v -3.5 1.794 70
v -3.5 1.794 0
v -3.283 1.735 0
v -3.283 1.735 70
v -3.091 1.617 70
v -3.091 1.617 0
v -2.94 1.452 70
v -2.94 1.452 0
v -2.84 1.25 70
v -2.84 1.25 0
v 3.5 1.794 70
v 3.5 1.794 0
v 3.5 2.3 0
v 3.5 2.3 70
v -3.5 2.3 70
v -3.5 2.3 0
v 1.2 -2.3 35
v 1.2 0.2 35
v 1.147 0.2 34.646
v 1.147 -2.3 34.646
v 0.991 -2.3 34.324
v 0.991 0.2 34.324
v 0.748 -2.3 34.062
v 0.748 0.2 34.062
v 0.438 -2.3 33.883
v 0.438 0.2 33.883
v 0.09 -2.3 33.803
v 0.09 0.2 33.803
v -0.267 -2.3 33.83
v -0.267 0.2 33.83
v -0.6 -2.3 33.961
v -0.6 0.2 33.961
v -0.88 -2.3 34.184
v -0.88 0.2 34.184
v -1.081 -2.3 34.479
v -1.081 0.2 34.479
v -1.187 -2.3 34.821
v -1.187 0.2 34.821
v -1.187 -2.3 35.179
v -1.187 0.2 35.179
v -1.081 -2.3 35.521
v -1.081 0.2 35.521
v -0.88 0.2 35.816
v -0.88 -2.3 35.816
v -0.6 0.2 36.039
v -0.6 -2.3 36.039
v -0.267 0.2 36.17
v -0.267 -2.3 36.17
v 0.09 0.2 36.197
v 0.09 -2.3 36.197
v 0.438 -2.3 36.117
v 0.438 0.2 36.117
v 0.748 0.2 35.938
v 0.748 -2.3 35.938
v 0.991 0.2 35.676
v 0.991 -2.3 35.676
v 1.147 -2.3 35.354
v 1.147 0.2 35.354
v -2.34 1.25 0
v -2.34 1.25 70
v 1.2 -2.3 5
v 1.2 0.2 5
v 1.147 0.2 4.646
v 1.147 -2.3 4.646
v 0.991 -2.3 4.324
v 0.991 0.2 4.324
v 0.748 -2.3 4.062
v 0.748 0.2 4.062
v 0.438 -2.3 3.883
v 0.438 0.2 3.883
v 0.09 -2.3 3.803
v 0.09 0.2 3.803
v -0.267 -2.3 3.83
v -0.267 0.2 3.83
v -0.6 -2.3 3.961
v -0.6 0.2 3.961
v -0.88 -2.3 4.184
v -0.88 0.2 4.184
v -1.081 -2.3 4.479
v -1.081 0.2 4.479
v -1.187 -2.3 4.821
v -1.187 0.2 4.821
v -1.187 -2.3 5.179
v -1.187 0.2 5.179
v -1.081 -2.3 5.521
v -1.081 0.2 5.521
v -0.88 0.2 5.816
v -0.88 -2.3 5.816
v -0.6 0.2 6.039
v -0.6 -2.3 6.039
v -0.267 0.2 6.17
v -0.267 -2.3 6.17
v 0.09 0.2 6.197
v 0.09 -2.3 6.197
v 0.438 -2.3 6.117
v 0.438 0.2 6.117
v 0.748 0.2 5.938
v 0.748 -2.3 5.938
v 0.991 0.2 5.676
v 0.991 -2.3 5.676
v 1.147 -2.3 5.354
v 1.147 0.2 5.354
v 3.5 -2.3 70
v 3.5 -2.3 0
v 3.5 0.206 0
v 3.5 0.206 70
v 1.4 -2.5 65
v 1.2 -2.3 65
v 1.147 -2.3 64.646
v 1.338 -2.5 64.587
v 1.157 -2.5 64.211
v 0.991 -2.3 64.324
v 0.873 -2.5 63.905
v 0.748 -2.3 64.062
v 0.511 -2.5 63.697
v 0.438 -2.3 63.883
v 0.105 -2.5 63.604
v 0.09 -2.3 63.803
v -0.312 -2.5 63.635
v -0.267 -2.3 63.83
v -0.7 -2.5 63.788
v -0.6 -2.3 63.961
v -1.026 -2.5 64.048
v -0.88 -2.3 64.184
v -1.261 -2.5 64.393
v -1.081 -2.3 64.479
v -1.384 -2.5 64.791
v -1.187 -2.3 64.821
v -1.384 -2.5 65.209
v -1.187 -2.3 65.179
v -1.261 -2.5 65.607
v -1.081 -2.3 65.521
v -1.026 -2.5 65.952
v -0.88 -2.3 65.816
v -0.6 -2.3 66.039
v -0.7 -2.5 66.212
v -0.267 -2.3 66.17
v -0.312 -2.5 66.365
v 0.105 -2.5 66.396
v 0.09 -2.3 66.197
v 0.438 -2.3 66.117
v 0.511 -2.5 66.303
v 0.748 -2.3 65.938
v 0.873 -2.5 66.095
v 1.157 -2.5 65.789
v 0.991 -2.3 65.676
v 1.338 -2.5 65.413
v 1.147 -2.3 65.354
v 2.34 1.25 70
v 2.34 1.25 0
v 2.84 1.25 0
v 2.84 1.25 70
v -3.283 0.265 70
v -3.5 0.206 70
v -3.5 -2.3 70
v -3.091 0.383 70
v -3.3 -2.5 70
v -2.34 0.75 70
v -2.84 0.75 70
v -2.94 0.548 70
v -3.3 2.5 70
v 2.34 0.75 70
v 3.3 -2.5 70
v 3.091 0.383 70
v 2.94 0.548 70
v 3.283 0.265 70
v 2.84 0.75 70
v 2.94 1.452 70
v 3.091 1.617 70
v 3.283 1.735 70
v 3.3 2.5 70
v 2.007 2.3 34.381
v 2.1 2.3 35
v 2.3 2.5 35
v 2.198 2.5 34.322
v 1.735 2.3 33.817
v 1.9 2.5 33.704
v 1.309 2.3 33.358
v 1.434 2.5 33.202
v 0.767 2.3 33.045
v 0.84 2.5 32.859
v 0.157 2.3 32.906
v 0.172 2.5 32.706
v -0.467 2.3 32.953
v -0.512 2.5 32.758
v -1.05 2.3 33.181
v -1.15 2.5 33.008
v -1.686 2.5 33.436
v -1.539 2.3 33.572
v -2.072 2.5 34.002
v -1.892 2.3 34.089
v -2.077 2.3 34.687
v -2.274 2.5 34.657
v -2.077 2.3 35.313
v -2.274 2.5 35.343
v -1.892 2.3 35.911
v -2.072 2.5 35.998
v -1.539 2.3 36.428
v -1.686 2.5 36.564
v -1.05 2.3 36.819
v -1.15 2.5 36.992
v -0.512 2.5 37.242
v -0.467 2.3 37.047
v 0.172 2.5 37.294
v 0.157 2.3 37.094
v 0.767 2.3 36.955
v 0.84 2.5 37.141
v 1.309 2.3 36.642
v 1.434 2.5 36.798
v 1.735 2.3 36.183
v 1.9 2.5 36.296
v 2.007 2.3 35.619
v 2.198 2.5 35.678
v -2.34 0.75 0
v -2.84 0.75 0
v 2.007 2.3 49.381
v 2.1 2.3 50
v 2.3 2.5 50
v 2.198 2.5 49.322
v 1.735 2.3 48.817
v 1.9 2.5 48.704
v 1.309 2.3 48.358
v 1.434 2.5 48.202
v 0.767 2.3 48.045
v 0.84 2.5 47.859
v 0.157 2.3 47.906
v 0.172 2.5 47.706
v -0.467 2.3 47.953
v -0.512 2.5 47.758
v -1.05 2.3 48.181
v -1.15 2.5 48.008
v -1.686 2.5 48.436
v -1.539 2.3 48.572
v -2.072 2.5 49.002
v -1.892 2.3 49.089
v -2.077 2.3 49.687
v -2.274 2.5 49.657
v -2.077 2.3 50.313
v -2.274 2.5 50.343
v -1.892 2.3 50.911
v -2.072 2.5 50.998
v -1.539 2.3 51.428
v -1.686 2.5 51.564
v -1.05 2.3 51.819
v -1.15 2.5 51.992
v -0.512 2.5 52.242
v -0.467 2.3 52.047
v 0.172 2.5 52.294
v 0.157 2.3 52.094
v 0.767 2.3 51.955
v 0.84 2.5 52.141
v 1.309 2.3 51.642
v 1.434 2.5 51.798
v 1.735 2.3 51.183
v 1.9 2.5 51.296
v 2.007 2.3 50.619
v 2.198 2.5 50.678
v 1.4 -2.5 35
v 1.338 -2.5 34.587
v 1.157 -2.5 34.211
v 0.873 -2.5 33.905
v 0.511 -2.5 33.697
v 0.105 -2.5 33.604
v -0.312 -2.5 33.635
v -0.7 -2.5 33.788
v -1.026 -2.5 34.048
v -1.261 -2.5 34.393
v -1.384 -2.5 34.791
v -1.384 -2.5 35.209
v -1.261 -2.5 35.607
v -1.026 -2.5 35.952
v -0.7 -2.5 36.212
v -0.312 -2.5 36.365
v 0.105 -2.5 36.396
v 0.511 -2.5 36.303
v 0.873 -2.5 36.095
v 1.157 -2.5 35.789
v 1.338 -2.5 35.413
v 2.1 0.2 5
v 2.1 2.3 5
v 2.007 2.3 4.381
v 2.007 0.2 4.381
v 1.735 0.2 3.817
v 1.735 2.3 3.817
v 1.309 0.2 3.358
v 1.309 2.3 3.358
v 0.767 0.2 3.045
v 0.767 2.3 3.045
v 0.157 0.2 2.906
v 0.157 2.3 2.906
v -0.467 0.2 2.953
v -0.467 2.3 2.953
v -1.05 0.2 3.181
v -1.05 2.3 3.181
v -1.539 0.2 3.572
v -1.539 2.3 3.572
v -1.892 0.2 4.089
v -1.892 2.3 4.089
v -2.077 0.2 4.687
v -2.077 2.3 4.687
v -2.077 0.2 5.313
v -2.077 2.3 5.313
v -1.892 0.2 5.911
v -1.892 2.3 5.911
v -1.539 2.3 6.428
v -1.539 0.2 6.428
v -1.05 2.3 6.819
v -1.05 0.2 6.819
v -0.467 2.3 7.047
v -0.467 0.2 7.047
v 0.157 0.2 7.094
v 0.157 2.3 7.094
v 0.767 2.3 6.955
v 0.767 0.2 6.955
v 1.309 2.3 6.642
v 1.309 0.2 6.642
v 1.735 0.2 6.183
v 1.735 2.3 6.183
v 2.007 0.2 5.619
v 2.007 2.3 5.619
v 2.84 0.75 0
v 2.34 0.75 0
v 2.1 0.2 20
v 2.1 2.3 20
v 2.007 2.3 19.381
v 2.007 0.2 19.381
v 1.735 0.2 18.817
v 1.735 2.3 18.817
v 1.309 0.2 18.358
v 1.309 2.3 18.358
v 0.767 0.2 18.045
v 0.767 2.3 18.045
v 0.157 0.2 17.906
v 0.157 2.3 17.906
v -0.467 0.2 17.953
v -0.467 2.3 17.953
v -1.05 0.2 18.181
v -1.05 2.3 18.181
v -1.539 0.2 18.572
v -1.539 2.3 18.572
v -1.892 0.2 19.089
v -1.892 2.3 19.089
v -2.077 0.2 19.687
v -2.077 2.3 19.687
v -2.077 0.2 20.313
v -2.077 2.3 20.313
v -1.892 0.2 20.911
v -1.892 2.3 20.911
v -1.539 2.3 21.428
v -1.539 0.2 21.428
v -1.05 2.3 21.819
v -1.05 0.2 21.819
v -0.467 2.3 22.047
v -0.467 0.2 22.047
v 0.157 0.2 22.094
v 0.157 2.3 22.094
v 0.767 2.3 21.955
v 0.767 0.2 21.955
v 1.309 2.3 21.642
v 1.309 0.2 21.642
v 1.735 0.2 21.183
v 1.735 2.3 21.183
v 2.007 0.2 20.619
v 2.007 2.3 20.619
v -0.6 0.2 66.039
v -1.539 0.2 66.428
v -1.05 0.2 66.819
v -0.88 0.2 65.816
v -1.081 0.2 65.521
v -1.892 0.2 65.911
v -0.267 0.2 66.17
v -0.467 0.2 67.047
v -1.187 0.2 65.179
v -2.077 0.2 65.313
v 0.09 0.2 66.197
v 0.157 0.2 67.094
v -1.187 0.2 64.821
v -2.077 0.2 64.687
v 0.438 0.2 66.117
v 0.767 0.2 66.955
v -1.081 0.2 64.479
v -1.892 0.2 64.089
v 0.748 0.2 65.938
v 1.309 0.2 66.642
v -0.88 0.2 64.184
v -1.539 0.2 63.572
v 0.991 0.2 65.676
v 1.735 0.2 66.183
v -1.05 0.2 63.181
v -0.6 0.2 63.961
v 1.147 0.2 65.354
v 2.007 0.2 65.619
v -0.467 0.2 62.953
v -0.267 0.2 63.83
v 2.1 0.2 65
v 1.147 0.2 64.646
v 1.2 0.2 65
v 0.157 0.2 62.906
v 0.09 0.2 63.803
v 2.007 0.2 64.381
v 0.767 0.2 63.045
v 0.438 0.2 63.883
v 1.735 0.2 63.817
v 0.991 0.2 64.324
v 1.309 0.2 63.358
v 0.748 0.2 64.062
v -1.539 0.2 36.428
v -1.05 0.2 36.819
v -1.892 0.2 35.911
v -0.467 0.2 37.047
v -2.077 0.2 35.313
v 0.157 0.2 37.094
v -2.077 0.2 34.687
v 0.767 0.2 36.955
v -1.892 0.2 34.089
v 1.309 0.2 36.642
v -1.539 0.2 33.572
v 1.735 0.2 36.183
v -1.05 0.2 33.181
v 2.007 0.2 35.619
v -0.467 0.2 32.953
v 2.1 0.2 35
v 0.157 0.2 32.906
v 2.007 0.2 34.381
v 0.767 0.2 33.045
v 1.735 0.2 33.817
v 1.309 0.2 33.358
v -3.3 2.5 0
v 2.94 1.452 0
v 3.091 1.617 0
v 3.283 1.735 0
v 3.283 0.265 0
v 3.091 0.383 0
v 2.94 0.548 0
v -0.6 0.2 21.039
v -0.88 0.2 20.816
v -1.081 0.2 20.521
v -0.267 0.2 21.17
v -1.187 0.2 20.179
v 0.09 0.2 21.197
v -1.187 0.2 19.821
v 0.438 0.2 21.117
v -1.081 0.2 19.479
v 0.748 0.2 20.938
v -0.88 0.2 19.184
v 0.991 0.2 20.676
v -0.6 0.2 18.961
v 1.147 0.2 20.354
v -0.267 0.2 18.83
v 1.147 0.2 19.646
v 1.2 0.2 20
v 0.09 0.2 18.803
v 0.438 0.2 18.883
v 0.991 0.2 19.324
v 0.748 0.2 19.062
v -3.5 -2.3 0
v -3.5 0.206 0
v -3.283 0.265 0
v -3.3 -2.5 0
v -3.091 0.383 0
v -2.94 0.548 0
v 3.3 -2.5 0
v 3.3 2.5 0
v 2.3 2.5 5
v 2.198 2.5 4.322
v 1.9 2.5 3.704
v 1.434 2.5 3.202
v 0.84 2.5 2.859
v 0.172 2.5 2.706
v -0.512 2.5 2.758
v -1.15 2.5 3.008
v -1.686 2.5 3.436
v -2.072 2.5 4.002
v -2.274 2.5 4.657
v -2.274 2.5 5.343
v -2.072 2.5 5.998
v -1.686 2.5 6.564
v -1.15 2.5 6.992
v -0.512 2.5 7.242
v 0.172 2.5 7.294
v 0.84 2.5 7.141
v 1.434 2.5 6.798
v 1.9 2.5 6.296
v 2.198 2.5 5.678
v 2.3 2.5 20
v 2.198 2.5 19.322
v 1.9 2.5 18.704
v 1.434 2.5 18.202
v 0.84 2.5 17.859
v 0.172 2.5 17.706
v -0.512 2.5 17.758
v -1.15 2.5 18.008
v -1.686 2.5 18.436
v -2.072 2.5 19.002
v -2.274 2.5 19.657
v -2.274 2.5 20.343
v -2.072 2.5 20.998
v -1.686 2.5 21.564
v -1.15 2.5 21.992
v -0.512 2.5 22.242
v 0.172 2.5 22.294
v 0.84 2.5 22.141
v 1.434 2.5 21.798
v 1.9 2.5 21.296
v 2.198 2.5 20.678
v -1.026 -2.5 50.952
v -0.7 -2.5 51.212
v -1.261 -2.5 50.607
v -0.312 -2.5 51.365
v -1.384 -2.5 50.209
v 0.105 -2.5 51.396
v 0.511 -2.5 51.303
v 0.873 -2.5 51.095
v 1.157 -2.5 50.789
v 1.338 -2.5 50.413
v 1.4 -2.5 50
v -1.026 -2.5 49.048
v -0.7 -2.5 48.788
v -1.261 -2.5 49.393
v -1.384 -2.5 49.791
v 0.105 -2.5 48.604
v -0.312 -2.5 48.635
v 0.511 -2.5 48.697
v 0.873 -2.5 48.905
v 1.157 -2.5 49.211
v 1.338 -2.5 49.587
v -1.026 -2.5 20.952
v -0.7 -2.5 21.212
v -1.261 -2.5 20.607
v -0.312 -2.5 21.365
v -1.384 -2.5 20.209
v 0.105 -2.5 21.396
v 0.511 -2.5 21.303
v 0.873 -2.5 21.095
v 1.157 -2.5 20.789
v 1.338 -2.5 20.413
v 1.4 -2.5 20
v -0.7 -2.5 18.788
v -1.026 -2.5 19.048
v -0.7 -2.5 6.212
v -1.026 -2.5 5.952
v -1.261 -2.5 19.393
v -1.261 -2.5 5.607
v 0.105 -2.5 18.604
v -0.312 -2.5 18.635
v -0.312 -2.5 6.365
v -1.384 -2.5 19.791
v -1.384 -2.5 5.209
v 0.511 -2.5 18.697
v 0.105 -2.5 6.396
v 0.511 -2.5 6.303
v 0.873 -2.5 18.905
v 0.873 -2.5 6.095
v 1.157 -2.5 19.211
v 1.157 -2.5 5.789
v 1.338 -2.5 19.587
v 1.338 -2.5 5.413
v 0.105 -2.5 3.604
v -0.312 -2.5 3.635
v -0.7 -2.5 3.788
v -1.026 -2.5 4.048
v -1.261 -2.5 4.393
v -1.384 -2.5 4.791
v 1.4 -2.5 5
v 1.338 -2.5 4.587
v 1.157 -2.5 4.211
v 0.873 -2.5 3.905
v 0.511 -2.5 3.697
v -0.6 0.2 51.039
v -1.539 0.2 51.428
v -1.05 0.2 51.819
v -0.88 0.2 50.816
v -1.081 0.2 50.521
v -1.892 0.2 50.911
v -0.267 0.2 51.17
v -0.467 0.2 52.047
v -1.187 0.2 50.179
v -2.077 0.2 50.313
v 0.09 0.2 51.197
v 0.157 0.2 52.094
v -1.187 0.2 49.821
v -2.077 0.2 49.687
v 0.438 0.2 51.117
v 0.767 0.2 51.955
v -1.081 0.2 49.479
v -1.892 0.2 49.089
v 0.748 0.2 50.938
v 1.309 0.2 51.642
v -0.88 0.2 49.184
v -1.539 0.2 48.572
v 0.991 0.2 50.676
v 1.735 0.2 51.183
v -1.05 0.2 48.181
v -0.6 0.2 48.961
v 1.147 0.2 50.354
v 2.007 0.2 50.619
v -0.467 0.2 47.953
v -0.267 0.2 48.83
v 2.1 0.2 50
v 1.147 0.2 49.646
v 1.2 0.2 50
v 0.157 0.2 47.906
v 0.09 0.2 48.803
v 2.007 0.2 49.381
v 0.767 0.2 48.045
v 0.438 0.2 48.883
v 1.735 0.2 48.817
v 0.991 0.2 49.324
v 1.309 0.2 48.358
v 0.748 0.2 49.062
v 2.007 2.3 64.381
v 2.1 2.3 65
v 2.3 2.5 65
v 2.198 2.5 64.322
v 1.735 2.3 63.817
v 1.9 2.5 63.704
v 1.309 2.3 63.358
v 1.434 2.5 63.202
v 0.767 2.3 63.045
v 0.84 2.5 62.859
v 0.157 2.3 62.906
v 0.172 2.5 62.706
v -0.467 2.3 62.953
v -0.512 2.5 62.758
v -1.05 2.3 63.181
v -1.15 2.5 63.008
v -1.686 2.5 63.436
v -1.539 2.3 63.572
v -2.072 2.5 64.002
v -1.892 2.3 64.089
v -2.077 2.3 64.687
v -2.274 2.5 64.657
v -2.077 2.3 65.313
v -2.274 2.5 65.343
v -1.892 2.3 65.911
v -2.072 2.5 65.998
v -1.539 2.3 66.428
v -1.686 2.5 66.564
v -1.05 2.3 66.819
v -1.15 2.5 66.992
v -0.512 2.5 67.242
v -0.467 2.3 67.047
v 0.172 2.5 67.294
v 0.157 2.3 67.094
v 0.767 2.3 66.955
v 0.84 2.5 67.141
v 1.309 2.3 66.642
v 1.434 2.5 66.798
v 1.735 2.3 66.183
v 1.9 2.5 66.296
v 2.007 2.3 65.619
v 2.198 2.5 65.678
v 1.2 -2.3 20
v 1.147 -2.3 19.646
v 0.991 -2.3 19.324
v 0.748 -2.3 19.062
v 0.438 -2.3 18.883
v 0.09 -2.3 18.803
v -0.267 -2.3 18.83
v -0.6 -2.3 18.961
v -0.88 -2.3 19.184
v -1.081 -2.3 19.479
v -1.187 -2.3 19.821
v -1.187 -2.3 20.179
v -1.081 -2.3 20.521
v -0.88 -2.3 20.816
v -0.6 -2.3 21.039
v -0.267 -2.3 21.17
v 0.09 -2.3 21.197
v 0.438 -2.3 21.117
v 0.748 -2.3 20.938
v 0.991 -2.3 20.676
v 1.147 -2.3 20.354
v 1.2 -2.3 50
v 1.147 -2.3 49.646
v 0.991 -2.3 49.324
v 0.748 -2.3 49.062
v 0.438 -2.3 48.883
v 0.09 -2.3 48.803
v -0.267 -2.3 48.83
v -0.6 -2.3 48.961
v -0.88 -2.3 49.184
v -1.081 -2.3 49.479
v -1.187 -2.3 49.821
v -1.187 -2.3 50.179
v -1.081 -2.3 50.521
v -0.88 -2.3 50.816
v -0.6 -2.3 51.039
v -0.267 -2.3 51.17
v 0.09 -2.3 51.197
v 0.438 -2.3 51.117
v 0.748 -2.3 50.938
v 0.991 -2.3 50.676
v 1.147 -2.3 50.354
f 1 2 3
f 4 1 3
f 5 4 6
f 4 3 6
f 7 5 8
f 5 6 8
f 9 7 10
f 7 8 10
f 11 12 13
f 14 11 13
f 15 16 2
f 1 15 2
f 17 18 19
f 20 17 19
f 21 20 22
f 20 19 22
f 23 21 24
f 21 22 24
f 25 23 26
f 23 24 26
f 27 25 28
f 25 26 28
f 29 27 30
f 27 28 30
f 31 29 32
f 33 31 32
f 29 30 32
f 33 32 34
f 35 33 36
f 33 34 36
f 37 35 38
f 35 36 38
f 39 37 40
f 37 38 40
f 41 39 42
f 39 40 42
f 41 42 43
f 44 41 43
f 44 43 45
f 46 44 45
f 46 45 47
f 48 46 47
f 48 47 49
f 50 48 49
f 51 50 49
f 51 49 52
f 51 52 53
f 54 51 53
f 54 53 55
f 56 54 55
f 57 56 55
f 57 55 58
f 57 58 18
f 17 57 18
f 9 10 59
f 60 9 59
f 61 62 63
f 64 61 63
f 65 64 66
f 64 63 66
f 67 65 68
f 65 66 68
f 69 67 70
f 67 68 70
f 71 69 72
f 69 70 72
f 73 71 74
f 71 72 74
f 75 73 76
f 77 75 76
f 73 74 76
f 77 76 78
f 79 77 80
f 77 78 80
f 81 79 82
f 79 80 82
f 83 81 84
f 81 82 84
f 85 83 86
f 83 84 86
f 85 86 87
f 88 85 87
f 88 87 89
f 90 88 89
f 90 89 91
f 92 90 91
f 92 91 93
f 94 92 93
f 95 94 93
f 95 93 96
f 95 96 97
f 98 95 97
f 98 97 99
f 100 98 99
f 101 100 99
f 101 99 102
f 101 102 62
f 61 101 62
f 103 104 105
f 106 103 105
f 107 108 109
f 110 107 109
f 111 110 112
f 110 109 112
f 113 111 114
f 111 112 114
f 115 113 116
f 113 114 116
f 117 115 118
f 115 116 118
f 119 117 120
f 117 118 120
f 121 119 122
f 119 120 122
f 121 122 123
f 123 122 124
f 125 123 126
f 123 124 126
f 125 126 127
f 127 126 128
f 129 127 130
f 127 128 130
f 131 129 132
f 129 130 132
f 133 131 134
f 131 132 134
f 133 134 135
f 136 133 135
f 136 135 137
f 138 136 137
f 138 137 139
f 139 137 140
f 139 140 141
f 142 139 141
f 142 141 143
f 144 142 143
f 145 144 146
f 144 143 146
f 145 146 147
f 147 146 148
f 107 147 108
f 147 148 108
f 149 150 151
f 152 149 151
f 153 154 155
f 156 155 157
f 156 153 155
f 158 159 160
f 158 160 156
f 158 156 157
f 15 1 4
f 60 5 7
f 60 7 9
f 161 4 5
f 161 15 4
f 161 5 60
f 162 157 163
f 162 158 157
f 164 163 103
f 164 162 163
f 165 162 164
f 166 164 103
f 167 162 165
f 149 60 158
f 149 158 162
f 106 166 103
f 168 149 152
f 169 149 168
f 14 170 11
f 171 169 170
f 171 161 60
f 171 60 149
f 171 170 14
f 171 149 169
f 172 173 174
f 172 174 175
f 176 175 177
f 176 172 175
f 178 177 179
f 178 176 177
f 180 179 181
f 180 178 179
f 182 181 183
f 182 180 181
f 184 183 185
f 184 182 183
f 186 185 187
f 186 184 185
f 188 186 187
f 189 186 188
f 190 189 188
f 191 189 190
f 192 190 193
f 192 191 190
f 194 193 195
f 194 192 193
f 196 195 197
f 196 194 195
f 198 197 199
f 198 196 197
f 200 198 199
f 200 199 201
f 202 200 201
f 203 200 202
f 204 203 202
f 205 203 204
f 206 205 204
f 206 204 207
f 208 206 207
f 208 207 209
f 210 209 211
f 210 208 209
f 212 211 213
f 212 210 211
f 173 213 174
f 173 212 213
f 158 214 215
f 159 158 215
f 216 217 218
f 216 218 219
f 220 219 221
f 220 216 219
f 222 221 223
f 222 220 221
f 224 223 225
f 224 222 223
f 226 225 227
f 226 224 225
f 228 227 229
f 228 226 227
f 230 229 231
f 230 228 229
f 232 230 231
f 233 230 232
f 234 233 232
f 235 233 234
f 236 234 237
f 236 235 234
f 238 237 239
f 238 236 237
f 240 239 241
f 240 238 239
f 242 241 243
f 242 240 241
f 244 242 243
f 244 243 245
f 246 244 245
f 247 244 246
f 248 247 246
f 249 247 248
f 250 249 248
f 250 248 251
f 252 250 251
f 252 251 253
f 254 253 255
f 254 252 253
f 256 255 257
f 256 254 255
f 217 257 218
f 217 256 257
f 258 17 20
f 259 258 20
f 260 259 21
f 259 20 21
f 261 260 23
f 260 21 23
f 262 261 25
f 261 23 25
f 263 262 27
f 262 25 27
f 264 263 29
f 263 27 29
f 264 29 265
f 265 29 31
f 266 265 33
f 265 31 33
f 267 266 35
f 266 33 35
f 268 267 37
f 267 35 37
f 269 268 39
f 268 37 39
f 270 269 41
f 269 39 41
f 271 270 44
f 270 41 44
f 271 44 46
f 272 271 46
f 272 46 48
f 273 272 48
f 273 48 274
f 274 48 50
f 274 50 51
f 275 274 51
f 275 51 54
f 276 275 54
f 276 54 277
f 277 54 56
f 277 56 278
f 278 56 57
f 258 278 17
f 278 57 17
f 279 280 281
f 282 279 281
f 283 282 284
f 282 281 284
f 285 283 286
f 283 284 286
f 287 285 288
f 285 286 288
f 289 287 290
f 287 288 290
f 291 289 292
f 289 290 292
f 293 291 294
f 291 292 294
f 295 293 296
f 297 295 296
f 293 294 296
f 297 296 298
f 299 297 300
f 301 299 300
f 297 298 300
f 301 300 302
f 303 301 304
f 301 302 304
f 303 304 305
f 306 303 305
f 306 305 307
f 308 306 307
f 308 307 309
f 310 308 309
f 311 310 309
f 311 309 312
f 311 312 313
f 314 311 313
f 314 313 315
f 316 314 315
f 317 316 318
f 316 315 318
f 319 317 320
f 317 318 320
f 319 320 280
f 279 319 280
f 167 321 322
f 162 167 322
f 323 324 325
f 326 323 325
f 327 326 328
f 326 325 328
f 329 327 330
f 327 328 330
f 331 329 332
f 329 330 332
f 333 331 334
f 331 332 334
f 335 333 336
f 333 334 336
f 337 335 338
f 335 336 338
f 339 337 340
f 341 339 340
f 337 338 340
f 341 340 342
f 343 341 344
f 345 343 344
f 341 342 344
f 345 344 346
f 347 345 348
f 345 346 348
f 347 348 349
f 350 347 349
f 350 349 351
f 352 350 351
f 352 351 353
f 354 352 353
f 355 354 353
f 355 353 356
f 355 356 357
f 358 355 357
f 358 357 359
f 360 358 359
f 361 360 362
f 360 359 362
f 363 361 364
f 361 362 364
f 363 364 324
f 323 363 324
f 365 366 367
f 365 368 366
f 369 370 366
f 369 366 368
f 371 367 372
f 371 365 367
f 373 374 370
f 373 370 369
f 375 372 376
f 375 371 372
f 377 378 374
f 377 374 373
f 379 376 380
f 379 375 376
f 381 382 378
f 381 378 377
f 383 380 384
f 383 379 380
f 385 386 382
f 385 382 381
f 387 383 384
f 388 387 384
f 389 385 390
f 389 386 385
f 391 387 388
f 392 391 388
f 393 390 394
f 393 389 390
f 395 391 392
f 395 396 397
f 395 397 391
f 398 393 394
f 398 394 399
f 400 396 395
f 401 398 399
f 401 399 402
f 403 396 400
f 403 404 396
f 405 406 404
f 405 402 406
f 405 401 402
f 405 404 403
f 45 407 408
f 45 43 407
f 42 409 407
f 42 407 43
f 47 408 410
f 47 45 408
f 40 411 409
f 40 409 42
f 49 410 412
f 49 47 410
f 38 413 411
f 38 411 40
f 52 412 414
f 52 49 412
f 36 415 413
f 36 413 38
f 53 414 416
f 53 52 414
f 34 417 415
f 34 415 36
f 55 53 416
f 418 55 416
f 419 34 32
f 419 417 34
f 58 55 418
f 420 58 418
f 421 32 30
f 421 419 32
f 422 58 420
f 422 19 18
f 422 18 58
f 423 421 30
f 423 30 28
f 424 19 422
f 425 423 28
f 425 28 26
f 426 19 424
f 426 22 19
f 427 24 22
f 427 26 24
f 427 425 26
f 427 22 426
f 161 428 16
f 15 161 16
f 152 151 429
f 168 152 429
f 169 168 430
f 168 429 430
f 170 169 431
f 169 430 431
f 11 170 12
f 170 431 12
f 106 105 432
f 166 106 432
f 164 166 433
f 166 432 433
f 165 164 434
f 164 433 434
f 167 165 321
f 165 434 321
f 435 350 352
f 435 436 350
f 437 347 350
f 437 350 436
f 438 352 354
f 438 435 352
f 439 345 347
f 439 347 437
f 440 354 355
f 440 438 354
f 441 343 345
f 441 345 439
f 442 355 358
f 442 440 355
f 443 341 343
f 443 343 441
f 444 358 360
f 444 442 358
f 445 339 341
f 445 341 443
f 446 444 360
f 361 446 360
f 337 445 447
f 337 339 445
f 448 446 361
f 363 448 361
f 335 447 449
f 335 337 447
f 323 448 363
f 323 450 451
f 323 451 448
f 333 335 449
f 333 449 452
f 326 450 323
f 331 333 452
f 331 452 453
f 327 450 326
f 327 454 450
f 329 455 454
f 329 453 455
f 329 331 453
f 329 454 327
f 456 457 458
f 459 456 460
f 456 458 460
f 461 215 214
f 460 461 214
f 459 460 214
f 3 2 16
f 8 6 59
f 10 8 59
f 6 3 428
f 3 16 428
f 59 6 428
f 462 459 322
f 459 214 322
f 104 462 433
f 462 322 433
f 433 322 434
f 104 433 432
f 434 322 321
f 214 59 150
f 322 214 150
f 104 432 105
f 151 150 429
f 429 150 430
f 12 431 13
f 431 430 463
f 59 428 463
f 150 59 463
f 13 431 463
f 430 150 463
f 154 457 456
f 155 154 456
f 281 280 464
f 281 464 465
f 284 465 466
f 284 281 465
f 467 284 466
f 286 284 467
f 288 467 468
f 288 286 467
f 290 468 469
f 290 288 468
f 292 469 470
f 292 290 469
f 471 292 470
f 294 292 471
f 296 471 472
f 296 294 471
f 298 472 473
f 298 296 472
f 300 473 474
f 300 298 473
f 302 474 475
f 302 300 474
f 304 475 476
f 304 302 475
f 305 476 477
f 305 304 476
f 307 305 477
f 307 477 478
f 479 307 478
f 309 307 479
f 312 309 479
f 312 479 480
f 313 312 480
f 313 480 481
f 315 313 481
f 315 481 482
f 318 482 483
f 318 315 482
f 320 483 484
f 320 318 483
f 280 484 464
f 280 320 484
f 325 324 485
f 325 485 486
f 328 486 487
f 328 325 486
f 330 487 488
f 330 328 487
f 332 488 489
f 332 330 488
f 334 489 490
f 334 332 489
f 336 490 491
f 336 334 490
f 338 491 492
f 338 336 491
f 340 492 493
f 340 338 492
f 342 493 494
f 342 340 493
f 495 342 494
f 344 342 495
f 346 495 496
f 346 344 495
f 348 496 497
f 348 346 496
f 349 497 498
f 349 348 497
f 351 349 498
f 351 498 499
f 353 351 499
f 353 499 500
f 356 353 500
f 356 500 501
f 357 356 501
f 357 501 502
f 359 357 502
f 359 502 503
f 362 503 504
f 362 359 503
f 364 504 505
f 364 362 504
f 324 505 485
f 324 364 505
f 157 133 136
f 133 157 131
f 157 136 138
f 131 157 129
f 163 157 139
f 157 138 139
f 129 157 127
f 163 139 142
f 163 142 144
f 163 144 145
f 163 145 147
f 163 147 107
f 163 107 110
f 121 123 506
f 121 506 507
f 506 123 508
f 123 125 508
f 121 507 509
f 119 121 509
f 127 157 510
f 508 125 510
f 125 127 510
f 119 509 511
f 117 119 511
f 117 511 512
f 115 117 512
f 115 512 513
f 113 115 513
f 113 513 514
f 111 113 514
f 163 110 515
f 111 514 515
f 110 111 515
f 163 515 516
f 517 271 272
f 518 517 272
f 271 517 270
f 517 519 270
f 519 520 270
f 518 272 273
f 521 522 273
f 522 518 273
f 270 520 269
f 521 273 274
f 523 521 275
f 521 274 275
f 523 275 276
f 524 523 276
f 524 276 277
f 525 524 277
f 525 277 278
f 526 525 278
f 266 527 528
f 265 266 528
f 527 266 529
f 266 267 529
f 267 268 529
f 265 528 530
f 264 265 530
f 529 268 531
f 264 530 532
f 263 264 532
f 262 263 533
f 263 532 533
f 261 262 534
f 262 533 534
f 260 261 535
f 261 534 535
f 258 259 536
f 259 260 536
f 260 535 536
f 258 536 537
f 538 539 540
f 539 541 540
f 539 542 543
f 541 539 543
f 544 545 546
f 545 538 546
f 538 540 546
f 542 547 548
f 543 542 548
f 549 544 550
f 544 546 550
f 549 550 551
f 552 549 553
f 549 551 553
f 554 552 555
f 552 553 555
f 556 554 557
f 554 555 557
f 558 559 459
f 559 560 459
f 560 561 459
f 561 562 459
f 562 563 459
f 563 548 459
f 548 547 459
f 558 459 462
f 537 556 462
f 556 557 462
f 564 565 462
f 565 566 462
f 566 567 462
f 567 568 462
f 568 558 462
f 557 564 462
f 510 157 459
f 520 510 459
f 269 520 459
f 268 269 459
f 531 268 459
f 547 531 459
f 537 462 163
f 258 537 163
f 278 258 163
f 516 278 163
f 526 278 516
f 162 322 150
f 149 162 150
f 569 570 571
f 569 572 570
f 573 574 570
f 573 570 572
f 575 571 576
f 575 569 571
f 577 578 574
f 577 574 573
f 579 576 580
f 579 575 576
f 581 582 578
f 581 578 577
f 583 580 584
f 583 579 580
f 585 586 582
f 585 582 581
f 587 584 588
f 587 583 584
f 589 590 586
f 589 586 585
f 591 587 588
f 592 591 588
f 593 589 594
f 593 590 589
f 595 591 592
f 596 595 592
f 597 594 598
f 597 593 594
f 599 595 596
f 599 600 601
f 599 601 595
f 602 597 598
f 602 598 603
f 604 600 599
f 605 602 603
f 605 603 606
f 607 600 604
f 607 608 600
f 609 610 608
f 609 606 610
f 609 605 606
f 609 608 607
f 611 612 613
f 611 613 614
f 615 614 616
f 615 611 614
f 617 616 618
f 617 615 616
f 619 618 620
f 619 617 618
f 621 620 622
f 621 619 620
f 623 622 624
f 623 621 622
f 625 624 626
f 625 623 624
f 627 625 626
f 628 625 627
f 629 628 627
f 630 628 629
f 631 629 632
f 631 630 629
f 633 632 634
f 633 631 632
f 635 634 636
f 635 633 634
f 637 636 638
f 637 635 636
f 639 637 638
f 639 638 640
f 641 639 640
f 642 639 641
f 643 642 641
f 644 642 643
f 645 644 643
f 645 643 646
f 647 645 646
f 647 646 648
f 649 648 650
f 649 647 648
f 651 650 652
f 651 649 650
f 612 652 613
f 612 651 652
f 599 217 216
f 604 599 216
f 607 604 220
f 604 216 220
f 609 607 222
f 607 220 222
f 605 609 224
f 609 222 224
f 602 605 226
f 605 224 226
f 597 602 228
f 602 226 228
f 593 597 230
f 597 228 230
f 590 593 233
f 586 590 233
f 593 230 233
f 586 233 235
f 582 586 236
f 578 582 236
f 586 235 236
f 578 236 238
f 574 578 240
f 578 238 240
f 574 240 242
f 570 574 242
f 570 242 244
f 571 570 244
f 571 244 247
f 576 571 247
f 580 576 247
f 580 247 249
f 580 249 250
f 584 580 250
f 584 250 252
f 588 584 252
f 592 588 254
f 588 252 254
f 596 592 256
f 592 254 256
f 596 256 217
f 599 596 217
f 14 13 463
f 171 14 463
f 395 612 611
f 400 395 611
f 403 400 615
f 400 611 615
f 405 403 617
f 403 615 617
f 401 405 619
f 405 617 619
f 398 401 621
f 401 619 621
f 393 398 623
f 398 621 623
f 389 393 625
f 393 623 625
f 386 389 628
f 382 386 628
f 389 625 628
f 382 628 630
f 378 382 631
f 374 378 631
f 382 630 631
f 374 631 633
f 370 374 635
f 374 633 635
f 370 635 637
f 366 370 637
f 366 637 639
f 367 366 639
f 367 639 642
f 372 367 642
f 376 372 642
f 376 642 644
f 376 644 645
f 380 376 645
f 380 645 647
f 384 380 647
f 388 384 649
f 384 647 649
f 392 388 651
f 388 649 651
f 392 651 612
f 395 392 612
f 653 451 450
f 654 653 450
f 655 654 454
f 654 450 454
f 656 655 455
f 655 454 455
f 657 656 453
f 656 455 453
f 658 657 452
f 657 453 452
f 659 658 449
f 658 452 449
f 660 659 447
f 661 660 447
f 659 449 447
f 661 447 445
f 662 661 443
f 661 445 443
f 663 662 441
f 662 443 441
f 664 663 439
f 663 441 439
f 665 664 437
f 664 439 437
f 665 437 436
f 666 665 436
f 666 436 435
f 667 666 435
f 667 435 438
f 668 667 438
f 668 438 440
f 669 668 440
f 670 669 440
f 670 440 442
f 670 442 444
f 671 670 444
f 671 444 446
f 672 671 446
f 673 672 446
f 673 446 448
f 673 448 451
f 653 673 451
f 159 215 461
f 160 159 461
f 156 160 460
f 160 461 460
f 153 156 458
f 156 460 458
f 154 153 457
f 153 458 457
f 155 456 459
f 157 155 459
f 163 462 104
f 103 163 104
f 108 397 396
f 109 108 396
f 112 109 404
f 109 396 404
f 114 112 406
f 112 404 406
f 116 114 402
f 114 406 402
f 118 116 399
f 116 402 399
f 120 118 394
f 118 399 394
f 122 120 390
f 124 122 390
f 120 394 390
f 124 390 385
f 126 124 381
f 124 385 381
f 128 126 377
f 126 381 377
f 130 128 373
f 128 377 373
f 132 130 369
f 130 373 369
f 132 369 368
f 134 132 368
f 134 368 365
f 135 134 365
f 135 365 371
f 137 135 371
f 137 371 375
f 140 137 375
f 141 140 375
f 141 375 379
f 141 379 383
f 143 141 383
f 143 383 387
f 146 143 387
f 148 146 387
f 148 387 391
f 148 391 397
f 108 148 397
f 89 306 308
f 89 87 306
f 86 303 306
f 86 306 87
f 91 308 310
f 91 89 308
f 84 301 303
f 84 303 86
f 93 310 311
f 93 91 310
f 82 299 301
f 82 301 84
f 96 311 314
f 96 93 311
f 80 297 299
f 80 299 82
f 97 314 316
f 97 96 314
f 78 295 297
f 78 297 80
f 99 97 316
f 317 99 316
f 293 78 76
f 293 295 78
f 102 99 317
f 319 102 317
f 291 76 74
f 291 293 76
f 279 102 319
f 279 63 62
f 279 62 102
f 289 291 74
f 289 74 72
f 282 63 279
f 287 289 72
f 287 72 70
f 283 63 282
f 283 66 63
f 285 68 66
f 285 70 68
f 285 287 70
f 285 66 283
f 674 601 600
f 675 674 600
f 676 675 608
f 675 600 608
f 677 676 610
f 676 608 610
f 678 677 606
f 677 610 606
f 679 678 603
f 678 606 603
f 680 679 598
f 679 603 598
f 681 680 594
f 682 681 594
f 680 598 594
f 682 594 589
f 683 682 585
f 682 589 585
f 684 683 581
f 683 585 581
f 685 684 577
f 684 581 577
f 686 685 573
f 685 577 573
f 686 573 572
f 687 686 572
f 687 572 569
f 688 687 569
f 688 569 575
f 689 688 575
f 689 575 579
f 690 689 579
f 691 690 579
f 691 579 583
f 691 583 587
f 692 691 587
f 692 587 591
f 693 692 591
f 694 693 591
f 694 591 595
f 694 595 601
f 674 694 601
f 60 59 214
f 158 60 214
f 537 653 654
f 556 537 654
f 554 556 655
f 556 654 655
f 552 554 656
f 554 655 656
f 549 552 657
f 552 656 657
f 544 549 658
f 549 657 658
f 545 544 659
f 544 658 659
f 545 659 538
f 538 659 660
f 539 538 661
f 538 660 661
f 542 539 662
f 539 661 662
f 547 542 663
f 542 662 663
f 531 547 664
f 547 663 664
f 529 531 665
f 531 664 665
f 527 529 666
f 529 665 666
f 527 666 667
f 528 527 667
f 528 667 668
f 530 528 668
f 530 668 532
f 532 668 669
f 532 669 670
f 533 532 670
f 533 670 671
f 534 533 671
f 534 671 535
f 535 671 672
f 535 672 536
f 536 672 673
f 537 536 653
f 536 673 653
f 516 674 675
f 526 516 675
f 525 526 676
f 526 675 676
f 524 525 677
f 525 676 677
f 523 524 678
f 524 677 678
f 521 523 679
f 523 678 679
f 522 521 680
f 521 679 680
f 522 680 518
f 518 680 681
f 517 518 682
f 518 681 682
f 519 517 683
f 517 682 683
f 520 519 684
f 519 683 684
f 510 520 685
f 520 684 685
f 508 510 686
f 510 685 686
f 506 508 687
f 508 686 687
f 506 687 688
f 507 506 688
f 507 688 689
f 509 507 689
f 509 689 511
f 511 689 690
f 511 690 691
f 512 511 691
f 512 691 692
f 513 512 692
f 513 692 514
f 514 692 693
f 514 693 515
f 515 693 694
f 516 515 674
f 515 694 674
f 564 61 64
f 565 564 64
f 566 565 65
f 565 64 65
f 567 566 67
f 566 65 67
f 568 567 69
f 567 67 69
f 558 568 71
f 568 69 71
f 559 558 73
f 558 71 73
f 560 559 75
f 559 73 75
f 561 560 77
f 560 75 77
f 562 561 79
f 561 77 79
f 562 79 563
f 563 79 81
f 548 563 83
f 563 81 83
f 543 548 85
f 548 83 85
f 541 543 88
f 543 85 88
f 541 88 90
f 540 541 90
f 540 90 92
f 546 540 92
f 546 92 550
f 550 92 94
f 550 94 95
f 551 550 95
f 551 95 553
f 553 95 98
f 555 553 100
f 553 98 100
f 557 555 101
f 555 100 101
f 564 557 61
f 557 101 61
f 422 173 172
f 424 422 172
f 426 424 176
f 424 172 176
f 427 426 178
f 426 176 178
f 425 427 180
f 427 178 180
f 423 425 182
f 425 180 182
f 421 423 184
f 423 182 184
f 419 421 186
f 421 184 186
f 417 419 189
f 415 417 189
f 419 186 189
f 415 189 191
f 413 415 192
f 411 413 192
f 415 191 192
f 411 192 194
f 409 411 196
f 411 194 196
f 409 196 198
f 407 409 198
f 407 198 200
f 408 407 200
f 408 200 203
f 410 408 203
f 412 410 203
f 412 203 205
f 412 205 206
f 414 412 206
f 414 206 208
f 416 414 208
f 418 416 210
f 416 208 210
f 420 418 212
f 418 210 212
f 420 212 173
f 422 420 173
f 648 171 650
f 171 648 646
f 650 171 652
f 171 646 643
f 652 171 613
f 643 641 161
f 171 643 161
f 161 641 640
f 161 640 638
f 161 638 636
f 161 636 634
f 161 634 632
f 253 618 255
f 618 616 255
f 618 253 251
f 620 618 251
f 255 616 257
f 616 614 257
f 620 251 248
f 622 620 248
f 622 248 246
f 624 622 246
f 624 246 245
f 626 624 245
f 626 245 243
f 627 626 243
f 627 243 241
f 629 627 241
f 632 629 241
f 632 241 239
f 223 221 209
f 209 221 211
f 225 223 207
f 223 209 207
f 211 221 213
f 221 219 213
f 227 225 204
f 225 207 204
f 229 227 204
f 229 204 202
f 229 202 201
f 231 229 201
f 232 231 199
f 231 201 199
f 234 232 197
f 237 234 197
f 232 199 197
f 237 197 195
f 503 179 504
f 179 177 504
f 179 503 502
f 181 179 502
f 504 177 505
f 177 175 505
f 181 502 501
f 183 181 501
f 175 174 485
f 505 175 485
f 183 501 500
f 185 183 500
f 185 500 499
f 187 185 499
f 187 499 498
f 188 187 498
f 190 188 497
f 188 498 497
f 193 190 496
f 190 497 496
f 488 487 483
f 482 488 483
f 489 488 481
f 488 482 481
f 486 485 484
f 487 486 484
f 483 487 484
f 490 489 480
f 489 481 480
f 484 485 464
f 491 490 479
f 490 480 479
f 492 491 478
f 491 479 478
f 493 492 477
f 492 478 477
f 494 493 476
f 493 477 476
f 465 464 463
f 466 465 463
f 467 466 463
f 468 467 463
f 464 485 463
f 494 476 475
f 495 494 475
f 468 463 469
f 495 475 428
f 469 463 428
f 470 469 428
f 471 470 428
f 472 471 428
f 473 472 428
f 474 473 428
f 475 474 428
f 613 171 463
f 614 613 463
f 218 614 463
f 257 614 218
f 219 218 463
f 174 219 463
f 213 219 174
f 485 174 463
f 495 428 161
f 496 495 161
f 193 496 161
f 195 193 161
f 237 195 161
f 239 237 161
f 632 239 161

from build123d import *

# Parameters (mm, degrees)
EXTRUDE1_DEPTH             = 70
EXTRUDE2_REACH             = 72.266
SKETCH2_R                  = 1.2
SKETCH_R                   = 2.1
SKETCH_R_2                 = 1.2
EXTRUDE4_DEPTH             = 2.3
CHAMFER1_SIZE              = 0.2
LPATTERN1_COUNT            = 5
LPATTERN1_PITCH            = 15
CHAMFER1_OF_LPATTERN1_SIZE = 0.2


with BuildPart() as part:
    # Sketch1 → Extrude1 (new body)
    with BuildSketch(Plane.XY):
        with BuildLine():
            Line((-3.3, -2.5), (3.3, -2.5))
            Line((3.3, -2.5), (3.5, -2.3))
            Line((3.5, -2.3), (3.5, 0.206274607))
            ThreePointArc((3.5, 0.206274607), (3.091294745, 0.382570681), (2.840065792, 0.75))
            Line((2.840065792, 0.75), (2.340065792, 0.75))
            Line((2.340065792, 0.75), (2.340065792, 1.25))
            Line((2.340065792, 1.25), (2.840065792, 1.25))
            ThreePointArc((2.840065792, 1.25), (3.091294745, 1.617429319), (3.5, 1.793725393))
            Line((3.5, 1.793725393), (3.5, 2.3))
            Line((3.5, 2.3), (3.3, 2.5))
            Line((3.3, 2.5), (-3.3, 2.5))
            Line((-3.3, 2.5), (-3.5, 2.3))
            Line((-3.5, 2.3), (-3.5, 1.793725393))
            ThreePointArc((-3.5, 1.793725393), (-3.091294745, 1.617429319), (-2.840065792, 1.25))
            Line((-2.840065792, 1.25), (-2.340065792, 1.25))
            Line((-2.340065792, 1.25), (-2.340065792, 0.75))
            Line((-2.340065792, 0.75), (-2.840065792, 0.75))
            ThreePointArc((-2.840065792, 0.75), (-3.091294745, 0.382570681), (-3.5, 0.206274607))
            Line((-3.5, 0.206274607), (-3.5, -2.3))
            Line((-3.5, -2.3), (-3.3, -2.5))
        make_face()
    extrude(amount=EXTRUDE1_DEPTH)

    # Sketch2 → Extrude2 (cut, up to next)
    with BuildSketch(Plane(origin=(0, 2.5, 0), x_dir=(1, 0, 0), z_dir=(0, 1, 0)), mode=Mode.PRIVATE) as extrude2_sk1:
        with Locations((0, -5)):
            Circle(SKETCH2_R)
    extrude2_tool1 = extrude(extrude2_sk1.sketch, amount=-EXTRUDE2_REACH, mode=Mode.PRIVATE) & part.part
    extrude2 = extrude2_tool1.solids().sort_by_distance((0, 2.5, 5))[0]
    add(extrude2, mode=Mode.SUBTRACT)

    # Sketch → Extrude4 (cut)
    with BuildSketch(Plane(origin=(0, 2.5, 0), x_dir=(1, 0, 0), z_dir=(0, 1, 0))):
        with Locations((0, -5)):
            Circle(SKETCH_R)
        with Locations((0, -5)):
            Circle(SKETCH_R_2, mode=Mode.SUBTRACT)
    extrude4 = extrude(amount=-EXTRUDE4_DEPTH, mode=Mode.SUBTRACT)

    # Chamfer1
    chamfer1_edges = [part.edges().sort_by_distance(p)[0] for p in [
        (-1.2, -2.5, 5),
        (-2.1, 2.5, 5),
    ]]
    chamfer(chamfer1_edges, length=CHAMFER1_SIZE)

    # LPattern1: Extrude2, Extrude4 ×5
    with Locations(*[(0, 0, i * LPATTERN1_PITCH) for i in range(1, LPATTERN1_COUNT)]):
        add(extrude2, mode=Mode.SUBTRACT)
        add(extrude4, mode=Mode.SUBTRACT)

    # Chamfer1 of LPattern1
    chamfer1_of_lpattern1_edges = [part.edges().sort_by_distance(p)[0] for p in [
        (-1.2, -2.5, 20),
        (-2.1, 2.5, 20),
        (-1.2, -2.5, 35),
        (-2.1, 2.5, 35),
        (-1.2, -2.5, 50),
        (-2.1, 2.5, 50),
        (-1.2, -2.5, 65),
        (-2.1, 2.5, 65),
    ]]
    chamfer(chamfer1_of_lpattern1_edges, length=CHAMFER1_OF_LPATTERN1_SIZE)


solid = part.part
